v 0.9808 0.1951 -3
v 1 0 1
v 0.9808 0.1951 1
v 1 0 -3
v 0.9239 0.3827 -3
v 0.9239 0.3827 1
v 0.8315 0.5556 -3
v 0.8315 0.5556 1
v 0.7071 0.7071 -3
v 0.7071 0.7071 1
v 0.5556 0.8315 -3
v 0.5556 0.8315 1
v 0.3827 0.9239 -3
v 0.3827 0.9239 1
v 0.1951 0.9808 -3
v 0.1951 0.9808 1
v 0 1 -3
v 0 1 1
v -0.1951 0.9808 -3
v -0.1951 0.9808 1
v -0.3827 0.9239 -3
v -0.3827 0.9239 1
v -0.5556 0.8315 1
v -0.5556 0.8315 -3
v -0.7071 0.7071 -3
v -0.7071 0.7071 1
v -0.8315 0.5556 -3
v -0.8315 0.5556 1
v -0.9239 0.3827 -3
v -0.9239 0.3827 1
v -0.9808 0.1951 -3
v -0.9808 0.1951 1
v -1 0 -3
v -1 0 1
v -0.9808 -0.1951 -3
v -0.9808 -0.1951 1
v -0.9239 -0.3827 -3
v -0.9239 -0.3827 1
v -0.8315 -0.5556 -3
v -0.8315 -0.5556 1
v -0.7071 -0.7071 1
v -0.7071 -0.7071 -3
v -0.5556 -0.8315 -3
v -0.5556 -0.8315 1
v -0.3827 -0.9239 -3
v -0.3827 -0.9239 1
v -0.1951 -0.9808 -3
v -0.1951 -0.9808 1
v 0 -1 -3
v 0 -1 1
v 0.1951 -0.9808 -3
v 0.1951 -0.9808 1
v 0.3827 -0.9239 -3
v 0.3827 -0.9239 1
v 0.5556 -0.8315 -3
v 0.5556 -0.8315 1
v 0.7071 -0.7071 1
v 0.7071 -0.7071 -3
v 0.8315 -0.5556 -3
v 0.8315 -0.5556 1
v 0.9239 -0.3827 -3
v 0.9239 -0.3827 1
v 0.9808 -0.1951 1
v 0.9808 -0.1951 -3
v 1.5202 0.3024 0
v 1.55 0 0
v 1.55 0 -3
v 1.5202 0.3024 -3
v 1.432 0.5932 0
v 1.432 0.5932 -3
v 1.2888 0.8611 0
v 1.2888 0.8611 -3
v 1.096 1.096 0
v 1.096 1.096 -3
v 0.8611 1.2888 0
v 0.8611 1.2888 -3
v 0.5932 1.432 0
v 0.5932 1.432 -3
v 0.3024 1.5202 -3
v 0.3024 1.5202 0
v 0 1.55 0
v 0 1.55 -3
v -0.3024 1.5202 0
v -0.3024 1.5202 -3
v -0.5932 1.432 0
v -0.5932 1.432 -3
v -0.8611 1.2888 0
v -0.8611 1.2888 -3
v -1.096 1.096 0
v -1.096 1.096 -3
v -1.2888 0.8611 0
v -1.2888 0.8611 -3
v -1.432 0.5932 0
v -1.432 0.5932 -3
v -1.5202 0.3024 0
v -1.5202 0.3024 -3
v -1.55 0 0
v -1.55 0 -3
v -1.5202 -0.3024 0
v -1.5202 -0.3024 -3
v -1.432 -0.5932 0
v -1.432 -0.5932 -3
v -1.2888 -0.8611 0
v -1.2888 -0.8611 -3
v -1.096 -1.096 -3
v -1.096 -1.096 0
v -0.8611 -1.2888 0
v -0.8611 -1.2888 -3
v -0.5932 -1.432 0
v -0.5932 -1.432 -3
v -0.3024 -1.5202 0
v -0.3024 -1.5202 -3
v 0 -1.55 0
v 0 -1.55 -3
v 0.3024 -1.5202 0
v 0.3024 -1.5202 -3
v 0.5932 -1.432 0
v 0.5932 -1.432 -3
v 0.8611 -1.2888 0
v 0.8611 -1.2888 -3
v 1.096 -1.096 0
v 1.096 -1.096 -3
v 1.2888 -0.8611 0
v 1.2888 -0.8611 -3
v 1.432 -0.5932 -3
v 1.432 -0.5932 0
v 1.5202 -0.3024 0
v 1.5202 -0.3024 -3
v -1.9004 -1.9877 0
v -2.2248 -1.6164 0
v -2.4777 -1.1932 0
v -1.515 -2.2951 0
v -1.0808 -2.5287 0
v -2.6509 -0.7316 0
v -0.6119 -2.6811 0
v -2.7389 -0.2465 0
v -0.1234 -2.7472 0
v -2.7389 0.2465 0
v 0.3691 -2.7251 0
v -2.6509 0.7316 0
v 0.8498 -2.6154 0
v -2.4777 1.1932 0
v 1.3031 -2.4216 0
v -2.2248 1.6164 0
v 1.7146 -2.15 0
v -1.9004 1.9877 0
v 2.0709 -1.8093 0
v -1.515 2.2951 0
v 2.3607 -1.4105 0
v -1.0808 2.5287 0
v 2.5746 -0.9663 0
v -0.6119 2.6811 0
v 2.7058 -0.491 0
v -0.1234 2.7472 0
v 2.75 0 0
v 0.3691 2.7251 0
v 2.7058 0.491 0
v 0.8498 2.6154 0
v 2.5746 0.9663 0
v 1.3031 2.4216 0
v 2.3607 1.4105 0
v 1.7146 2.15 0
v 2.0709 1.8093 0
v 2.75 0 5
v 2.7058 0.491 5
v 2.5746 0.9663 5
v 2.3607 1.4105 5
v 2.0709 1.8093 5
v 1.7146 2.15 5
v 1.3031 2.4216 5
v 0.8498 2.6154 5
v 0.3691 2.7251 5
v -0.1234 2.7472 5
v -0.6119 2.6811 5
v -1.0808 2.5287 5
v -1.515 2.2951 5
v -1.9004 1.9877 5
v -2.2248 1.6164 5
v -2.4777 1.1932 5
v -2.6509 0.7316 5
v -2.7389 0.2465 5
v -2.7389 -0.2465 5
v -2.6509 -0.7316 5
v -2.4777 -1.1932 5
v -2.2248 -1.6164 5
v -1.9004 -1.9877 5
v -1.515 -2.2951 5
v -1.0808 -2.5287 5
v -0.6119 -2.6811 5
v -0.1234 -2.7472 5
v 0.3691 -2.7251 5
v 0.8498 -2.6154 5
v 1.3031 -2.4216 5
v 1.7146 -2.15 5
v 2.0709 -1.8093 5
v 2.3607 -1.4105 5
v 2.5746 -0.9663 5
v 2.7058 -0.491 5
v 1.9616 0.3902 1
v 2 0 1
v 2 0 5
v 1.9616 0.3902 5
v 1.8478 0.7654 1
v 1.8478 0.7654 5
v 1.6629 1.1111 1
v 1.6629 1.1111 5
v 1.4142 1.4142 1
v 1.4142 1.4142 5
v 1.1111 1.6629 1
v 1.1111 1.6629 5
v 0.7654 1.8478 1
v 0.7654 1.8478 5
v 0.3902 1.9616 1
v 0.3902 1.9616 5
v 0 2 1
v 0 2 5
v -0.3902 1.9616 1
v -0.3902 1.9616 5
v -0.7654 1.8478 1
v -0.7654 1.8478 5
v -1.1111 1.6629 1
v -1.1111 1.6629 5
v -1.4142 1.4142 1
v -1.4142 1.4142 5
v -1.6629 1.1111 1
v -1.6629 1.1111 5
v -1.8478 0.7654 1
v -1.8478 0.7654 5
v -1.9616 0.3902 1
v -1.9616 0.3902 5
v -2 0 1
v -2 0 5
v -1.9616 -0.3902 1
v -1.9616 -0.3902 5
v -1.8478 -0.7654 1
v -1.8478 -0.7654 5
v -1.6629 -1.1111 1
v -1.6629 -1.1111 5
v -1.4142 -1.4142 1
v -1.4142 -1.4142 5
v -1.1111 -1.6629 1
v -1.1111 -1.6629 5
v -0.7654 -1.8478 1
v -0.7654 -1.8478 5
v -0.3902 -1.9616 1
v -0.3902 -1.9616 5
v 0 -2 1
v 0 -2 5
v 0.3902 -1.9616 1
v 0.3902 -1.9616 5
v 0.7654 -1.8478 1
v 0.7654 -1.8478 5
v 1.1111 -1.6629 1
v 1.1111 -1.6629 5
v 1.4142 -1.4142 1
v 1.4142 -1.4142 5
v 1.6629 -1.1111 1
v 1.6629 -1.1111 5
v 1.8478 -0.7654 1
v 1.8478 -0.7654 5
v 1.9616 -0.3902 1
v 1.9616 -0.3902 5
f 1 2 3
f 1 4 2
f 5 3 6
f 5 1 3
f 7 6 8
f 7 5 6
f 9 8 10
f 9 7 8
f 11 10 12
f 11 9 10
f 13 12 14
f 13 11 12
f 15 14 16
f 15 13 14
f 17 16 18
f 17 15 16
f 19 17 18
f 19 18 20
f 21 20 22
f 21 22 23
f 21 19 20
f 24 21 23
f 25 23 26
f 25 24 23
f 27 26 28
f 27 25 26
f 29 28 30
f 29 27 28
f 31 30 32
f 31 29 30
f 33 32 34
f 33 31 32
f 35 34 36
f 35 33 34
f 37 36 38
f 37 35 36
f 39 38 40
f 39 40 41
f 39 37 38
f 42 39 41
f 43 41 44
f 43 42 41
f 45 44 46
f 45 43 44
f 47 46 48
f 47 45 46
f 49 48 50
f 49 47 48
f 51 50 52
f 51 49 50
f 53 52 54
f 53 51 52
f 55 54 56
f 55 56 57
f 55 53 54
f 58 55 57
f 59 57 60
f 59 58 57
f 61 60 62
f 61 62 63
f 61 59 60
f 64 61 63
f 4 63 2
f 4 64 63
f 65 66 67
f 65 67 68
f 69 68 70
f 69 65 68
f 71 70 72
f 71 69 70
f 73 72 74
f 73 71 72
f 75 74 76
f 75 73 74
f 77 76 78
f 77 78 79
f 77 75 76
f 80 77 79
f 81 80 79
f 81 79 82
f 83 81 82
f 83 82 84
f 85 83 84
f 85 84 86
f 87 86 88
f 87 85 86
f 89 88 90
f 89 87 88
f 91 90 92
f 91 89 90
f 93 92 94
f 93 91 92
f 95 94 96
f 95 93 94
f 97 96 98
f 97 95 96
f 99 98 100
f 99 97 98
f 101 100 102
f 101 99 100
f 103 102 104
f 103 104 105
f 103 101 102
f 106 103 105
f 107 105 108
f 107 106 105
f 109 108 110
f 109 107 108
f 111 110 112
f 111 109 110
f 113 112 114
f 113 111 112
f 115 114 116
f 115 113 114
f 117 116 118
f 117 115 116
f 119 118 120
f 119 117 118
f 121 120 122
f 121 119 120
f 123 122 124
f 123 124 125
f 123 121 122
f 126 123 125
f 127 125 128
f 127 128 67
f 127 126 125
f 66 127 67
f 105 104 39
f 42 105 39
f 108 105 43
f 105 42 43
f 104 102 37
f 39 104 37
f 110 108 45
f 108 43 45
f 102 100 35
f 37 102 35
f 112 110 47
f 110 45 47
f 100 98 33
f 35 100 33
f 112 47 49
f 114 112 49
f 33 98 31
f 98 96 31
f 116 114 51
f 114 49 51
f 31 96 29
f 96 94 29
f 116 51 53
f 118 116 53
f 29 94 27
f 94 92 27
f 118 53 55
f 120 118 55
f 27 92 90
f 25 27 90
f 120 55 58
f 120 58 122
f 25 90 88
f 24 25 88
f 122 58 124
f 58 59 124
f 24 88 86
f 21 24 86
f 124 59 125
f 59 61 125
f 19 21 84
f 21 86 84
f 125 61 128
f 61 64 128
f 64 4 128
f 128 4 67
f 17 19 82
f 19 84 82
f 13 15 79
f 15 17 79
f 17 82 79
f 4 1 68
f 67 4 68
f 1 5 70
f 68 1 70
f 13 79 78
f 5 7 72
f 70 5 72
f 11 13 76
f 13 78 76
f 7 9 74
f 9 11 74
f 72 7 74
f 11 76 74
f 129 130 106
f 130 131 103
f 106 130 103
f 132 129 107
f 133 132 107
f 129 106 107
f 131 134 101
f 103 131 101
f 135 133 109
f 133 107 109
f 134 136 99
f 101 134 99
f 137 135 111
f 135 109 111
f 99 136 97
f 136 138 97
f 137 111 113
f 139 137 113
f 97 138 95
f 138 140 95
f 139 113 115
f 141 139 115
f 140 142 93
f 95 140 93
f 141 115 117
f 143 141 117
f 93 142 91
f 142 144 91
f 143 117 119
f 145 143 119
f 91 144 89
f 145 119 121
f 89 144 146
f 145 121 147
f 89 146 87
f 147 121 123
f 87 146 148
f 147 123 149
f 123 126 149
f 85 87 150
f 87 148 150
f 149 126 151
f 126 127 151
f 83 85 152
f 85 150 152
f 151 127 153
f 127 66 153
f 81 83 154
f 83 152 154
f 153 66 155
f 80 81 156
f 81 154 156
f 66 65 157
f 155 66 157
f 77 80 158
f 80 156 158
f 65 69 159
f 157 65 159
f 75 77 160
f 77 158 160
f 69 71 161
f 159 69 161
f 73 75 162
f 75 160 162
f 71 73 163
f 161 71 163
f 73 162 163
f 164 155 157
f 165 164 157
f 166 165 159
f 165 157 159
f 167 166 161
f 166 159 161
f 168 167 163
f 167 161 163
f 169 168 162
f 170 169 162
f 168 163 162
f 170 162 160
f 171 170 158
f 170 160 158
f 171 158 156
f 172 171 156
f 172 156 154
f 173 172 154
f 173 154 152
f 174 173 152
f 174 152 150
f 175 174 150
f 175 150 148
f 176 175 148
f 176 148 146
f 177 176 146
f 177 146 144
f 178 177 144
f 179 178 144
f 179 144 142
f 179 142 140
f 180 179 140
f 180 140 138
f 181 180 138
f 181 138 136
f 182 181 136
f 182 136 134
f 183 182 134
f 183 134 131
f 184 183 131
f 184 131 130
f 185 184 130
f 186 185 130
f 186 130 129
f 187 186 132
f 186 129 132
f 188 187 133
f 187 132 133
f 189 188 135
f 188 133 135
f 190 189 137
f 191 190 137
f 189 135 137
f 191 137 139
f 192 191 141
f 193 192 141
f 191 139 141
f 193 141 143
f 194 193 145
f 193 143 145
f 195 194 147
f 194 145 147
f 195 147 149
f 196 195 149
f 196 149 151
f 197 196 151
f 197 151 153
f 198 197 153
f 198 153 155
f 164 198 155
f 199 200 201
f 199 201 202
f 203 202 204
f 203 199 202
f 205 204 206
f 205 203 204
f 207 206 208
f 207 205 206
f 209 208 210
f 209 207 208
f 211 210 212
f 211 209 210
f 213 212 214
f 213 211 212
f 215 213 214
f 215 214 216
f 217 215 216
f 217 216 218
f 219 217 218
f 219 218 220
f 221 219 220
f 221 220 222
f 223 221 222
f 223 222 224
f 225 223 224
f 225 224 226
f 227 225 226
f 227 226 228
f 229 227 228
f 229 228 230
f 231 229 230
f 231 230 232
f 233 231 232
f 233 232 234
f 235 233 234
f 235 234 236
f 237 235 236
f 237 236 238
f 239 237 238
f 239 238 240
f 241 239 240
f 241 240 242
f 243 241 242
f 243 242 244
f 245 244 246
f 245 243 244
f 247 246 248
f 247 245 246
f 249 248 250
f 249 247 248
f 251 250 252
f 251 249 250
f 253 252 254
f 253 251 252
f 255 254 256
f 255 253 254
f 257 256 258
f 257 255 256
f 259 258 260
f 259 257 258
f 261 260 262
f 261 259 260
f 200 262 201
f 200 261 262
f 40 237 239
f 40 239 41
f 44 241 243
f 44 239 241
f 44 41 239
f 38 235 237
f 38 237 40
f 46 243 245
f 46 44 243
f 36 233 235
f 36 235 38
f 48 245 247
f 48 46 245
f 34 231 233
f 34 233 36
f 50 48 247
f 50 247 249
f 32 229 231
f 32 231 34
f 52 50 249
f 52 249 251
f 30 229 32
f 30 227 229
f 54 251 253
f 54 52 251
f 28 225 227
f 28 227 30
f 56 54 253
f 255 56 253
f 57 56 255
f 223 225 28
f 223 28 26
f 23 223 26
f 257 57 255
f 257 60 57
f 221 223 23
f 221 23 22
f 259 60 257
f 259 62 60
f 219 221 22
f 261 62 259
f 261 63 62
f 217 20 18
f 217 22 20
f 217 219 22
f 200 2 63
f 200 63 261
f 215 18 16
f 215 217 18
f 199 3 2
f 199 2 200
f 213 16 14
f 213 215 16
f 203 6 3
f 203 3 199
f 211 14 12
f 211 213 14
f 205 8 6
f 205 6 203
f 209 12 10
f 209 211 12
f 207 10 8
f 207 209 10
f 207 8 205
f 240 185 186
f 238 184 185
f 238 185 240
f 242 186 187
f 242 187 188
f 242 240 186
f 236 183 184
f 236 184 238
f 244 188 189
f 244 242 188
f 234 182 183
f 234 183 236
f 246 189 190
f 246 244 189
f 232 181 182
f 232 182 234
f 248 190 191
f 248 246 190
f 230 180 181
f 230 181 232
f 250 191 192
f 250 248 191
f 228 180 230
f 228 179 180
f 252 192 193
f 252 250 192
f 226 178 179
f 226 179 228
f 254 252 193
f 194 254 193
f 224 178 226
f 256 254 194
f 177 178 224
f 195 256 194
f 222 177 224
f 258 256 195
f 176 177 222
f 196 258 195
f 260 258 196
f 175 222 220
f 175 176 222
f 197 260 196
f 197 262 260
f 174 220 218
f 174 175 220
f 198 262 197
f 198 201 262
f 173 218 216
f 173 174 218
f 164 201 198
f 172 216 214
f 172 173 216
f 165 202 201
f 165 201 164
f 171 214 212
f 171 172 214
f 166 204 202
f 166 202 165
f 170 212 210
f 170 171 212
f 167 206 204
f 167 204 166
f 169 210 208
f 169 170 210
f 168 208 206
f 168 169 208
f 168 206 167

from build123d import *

# Parameters (mm, degrees)
F0_R     = 2.75
F0_R_2   = 2
F1_DEPTH = 5
F0_R_3   = 1.55
F2_DEPTH = 1
F0_R_4   = 1
F3_DEPTH = 3
F4_DEPTH = 1


with BuildPart() as f1:
    # F0 (on Top) → F1 (new body)
    with BuildSketch(Plane.XY):
        Circle(F0_R)
        Circle(F0_R_2, mode=Mode.SUBTRACT)
    extrude(amount=F1_DEPTH)

    # F0 (on Top) → F2 (join)
    with BuildSketch(Plane.XY):
        Circle(F0_R)
        Circle(F0_R_2, mode=Mode.SUBTRACT)
        Circle(F0_R_2)
        Circle(F0_R_3, mode=Mode.SUBTRACT)
    extrude(amount=F2_DEPTH)

    # F0 (on Top) → F3 (join)
    with BuildSketch(Plane.XY):
        Circle(F0_R_3)
        Circle(F0_R_4, mode=Mode.SUBTRACT)
    extrude(amount=-F3_DEPTH)

    # F0 (on Top) → F4 (join)
    with BuildSketch(Plane.XY):
        Circle(F0_R_3)
        Circle(F0_R_4, mode=Mode.SUBTRACT)
    extrude(amount=F4_DEPTH)


solid = f1.part
